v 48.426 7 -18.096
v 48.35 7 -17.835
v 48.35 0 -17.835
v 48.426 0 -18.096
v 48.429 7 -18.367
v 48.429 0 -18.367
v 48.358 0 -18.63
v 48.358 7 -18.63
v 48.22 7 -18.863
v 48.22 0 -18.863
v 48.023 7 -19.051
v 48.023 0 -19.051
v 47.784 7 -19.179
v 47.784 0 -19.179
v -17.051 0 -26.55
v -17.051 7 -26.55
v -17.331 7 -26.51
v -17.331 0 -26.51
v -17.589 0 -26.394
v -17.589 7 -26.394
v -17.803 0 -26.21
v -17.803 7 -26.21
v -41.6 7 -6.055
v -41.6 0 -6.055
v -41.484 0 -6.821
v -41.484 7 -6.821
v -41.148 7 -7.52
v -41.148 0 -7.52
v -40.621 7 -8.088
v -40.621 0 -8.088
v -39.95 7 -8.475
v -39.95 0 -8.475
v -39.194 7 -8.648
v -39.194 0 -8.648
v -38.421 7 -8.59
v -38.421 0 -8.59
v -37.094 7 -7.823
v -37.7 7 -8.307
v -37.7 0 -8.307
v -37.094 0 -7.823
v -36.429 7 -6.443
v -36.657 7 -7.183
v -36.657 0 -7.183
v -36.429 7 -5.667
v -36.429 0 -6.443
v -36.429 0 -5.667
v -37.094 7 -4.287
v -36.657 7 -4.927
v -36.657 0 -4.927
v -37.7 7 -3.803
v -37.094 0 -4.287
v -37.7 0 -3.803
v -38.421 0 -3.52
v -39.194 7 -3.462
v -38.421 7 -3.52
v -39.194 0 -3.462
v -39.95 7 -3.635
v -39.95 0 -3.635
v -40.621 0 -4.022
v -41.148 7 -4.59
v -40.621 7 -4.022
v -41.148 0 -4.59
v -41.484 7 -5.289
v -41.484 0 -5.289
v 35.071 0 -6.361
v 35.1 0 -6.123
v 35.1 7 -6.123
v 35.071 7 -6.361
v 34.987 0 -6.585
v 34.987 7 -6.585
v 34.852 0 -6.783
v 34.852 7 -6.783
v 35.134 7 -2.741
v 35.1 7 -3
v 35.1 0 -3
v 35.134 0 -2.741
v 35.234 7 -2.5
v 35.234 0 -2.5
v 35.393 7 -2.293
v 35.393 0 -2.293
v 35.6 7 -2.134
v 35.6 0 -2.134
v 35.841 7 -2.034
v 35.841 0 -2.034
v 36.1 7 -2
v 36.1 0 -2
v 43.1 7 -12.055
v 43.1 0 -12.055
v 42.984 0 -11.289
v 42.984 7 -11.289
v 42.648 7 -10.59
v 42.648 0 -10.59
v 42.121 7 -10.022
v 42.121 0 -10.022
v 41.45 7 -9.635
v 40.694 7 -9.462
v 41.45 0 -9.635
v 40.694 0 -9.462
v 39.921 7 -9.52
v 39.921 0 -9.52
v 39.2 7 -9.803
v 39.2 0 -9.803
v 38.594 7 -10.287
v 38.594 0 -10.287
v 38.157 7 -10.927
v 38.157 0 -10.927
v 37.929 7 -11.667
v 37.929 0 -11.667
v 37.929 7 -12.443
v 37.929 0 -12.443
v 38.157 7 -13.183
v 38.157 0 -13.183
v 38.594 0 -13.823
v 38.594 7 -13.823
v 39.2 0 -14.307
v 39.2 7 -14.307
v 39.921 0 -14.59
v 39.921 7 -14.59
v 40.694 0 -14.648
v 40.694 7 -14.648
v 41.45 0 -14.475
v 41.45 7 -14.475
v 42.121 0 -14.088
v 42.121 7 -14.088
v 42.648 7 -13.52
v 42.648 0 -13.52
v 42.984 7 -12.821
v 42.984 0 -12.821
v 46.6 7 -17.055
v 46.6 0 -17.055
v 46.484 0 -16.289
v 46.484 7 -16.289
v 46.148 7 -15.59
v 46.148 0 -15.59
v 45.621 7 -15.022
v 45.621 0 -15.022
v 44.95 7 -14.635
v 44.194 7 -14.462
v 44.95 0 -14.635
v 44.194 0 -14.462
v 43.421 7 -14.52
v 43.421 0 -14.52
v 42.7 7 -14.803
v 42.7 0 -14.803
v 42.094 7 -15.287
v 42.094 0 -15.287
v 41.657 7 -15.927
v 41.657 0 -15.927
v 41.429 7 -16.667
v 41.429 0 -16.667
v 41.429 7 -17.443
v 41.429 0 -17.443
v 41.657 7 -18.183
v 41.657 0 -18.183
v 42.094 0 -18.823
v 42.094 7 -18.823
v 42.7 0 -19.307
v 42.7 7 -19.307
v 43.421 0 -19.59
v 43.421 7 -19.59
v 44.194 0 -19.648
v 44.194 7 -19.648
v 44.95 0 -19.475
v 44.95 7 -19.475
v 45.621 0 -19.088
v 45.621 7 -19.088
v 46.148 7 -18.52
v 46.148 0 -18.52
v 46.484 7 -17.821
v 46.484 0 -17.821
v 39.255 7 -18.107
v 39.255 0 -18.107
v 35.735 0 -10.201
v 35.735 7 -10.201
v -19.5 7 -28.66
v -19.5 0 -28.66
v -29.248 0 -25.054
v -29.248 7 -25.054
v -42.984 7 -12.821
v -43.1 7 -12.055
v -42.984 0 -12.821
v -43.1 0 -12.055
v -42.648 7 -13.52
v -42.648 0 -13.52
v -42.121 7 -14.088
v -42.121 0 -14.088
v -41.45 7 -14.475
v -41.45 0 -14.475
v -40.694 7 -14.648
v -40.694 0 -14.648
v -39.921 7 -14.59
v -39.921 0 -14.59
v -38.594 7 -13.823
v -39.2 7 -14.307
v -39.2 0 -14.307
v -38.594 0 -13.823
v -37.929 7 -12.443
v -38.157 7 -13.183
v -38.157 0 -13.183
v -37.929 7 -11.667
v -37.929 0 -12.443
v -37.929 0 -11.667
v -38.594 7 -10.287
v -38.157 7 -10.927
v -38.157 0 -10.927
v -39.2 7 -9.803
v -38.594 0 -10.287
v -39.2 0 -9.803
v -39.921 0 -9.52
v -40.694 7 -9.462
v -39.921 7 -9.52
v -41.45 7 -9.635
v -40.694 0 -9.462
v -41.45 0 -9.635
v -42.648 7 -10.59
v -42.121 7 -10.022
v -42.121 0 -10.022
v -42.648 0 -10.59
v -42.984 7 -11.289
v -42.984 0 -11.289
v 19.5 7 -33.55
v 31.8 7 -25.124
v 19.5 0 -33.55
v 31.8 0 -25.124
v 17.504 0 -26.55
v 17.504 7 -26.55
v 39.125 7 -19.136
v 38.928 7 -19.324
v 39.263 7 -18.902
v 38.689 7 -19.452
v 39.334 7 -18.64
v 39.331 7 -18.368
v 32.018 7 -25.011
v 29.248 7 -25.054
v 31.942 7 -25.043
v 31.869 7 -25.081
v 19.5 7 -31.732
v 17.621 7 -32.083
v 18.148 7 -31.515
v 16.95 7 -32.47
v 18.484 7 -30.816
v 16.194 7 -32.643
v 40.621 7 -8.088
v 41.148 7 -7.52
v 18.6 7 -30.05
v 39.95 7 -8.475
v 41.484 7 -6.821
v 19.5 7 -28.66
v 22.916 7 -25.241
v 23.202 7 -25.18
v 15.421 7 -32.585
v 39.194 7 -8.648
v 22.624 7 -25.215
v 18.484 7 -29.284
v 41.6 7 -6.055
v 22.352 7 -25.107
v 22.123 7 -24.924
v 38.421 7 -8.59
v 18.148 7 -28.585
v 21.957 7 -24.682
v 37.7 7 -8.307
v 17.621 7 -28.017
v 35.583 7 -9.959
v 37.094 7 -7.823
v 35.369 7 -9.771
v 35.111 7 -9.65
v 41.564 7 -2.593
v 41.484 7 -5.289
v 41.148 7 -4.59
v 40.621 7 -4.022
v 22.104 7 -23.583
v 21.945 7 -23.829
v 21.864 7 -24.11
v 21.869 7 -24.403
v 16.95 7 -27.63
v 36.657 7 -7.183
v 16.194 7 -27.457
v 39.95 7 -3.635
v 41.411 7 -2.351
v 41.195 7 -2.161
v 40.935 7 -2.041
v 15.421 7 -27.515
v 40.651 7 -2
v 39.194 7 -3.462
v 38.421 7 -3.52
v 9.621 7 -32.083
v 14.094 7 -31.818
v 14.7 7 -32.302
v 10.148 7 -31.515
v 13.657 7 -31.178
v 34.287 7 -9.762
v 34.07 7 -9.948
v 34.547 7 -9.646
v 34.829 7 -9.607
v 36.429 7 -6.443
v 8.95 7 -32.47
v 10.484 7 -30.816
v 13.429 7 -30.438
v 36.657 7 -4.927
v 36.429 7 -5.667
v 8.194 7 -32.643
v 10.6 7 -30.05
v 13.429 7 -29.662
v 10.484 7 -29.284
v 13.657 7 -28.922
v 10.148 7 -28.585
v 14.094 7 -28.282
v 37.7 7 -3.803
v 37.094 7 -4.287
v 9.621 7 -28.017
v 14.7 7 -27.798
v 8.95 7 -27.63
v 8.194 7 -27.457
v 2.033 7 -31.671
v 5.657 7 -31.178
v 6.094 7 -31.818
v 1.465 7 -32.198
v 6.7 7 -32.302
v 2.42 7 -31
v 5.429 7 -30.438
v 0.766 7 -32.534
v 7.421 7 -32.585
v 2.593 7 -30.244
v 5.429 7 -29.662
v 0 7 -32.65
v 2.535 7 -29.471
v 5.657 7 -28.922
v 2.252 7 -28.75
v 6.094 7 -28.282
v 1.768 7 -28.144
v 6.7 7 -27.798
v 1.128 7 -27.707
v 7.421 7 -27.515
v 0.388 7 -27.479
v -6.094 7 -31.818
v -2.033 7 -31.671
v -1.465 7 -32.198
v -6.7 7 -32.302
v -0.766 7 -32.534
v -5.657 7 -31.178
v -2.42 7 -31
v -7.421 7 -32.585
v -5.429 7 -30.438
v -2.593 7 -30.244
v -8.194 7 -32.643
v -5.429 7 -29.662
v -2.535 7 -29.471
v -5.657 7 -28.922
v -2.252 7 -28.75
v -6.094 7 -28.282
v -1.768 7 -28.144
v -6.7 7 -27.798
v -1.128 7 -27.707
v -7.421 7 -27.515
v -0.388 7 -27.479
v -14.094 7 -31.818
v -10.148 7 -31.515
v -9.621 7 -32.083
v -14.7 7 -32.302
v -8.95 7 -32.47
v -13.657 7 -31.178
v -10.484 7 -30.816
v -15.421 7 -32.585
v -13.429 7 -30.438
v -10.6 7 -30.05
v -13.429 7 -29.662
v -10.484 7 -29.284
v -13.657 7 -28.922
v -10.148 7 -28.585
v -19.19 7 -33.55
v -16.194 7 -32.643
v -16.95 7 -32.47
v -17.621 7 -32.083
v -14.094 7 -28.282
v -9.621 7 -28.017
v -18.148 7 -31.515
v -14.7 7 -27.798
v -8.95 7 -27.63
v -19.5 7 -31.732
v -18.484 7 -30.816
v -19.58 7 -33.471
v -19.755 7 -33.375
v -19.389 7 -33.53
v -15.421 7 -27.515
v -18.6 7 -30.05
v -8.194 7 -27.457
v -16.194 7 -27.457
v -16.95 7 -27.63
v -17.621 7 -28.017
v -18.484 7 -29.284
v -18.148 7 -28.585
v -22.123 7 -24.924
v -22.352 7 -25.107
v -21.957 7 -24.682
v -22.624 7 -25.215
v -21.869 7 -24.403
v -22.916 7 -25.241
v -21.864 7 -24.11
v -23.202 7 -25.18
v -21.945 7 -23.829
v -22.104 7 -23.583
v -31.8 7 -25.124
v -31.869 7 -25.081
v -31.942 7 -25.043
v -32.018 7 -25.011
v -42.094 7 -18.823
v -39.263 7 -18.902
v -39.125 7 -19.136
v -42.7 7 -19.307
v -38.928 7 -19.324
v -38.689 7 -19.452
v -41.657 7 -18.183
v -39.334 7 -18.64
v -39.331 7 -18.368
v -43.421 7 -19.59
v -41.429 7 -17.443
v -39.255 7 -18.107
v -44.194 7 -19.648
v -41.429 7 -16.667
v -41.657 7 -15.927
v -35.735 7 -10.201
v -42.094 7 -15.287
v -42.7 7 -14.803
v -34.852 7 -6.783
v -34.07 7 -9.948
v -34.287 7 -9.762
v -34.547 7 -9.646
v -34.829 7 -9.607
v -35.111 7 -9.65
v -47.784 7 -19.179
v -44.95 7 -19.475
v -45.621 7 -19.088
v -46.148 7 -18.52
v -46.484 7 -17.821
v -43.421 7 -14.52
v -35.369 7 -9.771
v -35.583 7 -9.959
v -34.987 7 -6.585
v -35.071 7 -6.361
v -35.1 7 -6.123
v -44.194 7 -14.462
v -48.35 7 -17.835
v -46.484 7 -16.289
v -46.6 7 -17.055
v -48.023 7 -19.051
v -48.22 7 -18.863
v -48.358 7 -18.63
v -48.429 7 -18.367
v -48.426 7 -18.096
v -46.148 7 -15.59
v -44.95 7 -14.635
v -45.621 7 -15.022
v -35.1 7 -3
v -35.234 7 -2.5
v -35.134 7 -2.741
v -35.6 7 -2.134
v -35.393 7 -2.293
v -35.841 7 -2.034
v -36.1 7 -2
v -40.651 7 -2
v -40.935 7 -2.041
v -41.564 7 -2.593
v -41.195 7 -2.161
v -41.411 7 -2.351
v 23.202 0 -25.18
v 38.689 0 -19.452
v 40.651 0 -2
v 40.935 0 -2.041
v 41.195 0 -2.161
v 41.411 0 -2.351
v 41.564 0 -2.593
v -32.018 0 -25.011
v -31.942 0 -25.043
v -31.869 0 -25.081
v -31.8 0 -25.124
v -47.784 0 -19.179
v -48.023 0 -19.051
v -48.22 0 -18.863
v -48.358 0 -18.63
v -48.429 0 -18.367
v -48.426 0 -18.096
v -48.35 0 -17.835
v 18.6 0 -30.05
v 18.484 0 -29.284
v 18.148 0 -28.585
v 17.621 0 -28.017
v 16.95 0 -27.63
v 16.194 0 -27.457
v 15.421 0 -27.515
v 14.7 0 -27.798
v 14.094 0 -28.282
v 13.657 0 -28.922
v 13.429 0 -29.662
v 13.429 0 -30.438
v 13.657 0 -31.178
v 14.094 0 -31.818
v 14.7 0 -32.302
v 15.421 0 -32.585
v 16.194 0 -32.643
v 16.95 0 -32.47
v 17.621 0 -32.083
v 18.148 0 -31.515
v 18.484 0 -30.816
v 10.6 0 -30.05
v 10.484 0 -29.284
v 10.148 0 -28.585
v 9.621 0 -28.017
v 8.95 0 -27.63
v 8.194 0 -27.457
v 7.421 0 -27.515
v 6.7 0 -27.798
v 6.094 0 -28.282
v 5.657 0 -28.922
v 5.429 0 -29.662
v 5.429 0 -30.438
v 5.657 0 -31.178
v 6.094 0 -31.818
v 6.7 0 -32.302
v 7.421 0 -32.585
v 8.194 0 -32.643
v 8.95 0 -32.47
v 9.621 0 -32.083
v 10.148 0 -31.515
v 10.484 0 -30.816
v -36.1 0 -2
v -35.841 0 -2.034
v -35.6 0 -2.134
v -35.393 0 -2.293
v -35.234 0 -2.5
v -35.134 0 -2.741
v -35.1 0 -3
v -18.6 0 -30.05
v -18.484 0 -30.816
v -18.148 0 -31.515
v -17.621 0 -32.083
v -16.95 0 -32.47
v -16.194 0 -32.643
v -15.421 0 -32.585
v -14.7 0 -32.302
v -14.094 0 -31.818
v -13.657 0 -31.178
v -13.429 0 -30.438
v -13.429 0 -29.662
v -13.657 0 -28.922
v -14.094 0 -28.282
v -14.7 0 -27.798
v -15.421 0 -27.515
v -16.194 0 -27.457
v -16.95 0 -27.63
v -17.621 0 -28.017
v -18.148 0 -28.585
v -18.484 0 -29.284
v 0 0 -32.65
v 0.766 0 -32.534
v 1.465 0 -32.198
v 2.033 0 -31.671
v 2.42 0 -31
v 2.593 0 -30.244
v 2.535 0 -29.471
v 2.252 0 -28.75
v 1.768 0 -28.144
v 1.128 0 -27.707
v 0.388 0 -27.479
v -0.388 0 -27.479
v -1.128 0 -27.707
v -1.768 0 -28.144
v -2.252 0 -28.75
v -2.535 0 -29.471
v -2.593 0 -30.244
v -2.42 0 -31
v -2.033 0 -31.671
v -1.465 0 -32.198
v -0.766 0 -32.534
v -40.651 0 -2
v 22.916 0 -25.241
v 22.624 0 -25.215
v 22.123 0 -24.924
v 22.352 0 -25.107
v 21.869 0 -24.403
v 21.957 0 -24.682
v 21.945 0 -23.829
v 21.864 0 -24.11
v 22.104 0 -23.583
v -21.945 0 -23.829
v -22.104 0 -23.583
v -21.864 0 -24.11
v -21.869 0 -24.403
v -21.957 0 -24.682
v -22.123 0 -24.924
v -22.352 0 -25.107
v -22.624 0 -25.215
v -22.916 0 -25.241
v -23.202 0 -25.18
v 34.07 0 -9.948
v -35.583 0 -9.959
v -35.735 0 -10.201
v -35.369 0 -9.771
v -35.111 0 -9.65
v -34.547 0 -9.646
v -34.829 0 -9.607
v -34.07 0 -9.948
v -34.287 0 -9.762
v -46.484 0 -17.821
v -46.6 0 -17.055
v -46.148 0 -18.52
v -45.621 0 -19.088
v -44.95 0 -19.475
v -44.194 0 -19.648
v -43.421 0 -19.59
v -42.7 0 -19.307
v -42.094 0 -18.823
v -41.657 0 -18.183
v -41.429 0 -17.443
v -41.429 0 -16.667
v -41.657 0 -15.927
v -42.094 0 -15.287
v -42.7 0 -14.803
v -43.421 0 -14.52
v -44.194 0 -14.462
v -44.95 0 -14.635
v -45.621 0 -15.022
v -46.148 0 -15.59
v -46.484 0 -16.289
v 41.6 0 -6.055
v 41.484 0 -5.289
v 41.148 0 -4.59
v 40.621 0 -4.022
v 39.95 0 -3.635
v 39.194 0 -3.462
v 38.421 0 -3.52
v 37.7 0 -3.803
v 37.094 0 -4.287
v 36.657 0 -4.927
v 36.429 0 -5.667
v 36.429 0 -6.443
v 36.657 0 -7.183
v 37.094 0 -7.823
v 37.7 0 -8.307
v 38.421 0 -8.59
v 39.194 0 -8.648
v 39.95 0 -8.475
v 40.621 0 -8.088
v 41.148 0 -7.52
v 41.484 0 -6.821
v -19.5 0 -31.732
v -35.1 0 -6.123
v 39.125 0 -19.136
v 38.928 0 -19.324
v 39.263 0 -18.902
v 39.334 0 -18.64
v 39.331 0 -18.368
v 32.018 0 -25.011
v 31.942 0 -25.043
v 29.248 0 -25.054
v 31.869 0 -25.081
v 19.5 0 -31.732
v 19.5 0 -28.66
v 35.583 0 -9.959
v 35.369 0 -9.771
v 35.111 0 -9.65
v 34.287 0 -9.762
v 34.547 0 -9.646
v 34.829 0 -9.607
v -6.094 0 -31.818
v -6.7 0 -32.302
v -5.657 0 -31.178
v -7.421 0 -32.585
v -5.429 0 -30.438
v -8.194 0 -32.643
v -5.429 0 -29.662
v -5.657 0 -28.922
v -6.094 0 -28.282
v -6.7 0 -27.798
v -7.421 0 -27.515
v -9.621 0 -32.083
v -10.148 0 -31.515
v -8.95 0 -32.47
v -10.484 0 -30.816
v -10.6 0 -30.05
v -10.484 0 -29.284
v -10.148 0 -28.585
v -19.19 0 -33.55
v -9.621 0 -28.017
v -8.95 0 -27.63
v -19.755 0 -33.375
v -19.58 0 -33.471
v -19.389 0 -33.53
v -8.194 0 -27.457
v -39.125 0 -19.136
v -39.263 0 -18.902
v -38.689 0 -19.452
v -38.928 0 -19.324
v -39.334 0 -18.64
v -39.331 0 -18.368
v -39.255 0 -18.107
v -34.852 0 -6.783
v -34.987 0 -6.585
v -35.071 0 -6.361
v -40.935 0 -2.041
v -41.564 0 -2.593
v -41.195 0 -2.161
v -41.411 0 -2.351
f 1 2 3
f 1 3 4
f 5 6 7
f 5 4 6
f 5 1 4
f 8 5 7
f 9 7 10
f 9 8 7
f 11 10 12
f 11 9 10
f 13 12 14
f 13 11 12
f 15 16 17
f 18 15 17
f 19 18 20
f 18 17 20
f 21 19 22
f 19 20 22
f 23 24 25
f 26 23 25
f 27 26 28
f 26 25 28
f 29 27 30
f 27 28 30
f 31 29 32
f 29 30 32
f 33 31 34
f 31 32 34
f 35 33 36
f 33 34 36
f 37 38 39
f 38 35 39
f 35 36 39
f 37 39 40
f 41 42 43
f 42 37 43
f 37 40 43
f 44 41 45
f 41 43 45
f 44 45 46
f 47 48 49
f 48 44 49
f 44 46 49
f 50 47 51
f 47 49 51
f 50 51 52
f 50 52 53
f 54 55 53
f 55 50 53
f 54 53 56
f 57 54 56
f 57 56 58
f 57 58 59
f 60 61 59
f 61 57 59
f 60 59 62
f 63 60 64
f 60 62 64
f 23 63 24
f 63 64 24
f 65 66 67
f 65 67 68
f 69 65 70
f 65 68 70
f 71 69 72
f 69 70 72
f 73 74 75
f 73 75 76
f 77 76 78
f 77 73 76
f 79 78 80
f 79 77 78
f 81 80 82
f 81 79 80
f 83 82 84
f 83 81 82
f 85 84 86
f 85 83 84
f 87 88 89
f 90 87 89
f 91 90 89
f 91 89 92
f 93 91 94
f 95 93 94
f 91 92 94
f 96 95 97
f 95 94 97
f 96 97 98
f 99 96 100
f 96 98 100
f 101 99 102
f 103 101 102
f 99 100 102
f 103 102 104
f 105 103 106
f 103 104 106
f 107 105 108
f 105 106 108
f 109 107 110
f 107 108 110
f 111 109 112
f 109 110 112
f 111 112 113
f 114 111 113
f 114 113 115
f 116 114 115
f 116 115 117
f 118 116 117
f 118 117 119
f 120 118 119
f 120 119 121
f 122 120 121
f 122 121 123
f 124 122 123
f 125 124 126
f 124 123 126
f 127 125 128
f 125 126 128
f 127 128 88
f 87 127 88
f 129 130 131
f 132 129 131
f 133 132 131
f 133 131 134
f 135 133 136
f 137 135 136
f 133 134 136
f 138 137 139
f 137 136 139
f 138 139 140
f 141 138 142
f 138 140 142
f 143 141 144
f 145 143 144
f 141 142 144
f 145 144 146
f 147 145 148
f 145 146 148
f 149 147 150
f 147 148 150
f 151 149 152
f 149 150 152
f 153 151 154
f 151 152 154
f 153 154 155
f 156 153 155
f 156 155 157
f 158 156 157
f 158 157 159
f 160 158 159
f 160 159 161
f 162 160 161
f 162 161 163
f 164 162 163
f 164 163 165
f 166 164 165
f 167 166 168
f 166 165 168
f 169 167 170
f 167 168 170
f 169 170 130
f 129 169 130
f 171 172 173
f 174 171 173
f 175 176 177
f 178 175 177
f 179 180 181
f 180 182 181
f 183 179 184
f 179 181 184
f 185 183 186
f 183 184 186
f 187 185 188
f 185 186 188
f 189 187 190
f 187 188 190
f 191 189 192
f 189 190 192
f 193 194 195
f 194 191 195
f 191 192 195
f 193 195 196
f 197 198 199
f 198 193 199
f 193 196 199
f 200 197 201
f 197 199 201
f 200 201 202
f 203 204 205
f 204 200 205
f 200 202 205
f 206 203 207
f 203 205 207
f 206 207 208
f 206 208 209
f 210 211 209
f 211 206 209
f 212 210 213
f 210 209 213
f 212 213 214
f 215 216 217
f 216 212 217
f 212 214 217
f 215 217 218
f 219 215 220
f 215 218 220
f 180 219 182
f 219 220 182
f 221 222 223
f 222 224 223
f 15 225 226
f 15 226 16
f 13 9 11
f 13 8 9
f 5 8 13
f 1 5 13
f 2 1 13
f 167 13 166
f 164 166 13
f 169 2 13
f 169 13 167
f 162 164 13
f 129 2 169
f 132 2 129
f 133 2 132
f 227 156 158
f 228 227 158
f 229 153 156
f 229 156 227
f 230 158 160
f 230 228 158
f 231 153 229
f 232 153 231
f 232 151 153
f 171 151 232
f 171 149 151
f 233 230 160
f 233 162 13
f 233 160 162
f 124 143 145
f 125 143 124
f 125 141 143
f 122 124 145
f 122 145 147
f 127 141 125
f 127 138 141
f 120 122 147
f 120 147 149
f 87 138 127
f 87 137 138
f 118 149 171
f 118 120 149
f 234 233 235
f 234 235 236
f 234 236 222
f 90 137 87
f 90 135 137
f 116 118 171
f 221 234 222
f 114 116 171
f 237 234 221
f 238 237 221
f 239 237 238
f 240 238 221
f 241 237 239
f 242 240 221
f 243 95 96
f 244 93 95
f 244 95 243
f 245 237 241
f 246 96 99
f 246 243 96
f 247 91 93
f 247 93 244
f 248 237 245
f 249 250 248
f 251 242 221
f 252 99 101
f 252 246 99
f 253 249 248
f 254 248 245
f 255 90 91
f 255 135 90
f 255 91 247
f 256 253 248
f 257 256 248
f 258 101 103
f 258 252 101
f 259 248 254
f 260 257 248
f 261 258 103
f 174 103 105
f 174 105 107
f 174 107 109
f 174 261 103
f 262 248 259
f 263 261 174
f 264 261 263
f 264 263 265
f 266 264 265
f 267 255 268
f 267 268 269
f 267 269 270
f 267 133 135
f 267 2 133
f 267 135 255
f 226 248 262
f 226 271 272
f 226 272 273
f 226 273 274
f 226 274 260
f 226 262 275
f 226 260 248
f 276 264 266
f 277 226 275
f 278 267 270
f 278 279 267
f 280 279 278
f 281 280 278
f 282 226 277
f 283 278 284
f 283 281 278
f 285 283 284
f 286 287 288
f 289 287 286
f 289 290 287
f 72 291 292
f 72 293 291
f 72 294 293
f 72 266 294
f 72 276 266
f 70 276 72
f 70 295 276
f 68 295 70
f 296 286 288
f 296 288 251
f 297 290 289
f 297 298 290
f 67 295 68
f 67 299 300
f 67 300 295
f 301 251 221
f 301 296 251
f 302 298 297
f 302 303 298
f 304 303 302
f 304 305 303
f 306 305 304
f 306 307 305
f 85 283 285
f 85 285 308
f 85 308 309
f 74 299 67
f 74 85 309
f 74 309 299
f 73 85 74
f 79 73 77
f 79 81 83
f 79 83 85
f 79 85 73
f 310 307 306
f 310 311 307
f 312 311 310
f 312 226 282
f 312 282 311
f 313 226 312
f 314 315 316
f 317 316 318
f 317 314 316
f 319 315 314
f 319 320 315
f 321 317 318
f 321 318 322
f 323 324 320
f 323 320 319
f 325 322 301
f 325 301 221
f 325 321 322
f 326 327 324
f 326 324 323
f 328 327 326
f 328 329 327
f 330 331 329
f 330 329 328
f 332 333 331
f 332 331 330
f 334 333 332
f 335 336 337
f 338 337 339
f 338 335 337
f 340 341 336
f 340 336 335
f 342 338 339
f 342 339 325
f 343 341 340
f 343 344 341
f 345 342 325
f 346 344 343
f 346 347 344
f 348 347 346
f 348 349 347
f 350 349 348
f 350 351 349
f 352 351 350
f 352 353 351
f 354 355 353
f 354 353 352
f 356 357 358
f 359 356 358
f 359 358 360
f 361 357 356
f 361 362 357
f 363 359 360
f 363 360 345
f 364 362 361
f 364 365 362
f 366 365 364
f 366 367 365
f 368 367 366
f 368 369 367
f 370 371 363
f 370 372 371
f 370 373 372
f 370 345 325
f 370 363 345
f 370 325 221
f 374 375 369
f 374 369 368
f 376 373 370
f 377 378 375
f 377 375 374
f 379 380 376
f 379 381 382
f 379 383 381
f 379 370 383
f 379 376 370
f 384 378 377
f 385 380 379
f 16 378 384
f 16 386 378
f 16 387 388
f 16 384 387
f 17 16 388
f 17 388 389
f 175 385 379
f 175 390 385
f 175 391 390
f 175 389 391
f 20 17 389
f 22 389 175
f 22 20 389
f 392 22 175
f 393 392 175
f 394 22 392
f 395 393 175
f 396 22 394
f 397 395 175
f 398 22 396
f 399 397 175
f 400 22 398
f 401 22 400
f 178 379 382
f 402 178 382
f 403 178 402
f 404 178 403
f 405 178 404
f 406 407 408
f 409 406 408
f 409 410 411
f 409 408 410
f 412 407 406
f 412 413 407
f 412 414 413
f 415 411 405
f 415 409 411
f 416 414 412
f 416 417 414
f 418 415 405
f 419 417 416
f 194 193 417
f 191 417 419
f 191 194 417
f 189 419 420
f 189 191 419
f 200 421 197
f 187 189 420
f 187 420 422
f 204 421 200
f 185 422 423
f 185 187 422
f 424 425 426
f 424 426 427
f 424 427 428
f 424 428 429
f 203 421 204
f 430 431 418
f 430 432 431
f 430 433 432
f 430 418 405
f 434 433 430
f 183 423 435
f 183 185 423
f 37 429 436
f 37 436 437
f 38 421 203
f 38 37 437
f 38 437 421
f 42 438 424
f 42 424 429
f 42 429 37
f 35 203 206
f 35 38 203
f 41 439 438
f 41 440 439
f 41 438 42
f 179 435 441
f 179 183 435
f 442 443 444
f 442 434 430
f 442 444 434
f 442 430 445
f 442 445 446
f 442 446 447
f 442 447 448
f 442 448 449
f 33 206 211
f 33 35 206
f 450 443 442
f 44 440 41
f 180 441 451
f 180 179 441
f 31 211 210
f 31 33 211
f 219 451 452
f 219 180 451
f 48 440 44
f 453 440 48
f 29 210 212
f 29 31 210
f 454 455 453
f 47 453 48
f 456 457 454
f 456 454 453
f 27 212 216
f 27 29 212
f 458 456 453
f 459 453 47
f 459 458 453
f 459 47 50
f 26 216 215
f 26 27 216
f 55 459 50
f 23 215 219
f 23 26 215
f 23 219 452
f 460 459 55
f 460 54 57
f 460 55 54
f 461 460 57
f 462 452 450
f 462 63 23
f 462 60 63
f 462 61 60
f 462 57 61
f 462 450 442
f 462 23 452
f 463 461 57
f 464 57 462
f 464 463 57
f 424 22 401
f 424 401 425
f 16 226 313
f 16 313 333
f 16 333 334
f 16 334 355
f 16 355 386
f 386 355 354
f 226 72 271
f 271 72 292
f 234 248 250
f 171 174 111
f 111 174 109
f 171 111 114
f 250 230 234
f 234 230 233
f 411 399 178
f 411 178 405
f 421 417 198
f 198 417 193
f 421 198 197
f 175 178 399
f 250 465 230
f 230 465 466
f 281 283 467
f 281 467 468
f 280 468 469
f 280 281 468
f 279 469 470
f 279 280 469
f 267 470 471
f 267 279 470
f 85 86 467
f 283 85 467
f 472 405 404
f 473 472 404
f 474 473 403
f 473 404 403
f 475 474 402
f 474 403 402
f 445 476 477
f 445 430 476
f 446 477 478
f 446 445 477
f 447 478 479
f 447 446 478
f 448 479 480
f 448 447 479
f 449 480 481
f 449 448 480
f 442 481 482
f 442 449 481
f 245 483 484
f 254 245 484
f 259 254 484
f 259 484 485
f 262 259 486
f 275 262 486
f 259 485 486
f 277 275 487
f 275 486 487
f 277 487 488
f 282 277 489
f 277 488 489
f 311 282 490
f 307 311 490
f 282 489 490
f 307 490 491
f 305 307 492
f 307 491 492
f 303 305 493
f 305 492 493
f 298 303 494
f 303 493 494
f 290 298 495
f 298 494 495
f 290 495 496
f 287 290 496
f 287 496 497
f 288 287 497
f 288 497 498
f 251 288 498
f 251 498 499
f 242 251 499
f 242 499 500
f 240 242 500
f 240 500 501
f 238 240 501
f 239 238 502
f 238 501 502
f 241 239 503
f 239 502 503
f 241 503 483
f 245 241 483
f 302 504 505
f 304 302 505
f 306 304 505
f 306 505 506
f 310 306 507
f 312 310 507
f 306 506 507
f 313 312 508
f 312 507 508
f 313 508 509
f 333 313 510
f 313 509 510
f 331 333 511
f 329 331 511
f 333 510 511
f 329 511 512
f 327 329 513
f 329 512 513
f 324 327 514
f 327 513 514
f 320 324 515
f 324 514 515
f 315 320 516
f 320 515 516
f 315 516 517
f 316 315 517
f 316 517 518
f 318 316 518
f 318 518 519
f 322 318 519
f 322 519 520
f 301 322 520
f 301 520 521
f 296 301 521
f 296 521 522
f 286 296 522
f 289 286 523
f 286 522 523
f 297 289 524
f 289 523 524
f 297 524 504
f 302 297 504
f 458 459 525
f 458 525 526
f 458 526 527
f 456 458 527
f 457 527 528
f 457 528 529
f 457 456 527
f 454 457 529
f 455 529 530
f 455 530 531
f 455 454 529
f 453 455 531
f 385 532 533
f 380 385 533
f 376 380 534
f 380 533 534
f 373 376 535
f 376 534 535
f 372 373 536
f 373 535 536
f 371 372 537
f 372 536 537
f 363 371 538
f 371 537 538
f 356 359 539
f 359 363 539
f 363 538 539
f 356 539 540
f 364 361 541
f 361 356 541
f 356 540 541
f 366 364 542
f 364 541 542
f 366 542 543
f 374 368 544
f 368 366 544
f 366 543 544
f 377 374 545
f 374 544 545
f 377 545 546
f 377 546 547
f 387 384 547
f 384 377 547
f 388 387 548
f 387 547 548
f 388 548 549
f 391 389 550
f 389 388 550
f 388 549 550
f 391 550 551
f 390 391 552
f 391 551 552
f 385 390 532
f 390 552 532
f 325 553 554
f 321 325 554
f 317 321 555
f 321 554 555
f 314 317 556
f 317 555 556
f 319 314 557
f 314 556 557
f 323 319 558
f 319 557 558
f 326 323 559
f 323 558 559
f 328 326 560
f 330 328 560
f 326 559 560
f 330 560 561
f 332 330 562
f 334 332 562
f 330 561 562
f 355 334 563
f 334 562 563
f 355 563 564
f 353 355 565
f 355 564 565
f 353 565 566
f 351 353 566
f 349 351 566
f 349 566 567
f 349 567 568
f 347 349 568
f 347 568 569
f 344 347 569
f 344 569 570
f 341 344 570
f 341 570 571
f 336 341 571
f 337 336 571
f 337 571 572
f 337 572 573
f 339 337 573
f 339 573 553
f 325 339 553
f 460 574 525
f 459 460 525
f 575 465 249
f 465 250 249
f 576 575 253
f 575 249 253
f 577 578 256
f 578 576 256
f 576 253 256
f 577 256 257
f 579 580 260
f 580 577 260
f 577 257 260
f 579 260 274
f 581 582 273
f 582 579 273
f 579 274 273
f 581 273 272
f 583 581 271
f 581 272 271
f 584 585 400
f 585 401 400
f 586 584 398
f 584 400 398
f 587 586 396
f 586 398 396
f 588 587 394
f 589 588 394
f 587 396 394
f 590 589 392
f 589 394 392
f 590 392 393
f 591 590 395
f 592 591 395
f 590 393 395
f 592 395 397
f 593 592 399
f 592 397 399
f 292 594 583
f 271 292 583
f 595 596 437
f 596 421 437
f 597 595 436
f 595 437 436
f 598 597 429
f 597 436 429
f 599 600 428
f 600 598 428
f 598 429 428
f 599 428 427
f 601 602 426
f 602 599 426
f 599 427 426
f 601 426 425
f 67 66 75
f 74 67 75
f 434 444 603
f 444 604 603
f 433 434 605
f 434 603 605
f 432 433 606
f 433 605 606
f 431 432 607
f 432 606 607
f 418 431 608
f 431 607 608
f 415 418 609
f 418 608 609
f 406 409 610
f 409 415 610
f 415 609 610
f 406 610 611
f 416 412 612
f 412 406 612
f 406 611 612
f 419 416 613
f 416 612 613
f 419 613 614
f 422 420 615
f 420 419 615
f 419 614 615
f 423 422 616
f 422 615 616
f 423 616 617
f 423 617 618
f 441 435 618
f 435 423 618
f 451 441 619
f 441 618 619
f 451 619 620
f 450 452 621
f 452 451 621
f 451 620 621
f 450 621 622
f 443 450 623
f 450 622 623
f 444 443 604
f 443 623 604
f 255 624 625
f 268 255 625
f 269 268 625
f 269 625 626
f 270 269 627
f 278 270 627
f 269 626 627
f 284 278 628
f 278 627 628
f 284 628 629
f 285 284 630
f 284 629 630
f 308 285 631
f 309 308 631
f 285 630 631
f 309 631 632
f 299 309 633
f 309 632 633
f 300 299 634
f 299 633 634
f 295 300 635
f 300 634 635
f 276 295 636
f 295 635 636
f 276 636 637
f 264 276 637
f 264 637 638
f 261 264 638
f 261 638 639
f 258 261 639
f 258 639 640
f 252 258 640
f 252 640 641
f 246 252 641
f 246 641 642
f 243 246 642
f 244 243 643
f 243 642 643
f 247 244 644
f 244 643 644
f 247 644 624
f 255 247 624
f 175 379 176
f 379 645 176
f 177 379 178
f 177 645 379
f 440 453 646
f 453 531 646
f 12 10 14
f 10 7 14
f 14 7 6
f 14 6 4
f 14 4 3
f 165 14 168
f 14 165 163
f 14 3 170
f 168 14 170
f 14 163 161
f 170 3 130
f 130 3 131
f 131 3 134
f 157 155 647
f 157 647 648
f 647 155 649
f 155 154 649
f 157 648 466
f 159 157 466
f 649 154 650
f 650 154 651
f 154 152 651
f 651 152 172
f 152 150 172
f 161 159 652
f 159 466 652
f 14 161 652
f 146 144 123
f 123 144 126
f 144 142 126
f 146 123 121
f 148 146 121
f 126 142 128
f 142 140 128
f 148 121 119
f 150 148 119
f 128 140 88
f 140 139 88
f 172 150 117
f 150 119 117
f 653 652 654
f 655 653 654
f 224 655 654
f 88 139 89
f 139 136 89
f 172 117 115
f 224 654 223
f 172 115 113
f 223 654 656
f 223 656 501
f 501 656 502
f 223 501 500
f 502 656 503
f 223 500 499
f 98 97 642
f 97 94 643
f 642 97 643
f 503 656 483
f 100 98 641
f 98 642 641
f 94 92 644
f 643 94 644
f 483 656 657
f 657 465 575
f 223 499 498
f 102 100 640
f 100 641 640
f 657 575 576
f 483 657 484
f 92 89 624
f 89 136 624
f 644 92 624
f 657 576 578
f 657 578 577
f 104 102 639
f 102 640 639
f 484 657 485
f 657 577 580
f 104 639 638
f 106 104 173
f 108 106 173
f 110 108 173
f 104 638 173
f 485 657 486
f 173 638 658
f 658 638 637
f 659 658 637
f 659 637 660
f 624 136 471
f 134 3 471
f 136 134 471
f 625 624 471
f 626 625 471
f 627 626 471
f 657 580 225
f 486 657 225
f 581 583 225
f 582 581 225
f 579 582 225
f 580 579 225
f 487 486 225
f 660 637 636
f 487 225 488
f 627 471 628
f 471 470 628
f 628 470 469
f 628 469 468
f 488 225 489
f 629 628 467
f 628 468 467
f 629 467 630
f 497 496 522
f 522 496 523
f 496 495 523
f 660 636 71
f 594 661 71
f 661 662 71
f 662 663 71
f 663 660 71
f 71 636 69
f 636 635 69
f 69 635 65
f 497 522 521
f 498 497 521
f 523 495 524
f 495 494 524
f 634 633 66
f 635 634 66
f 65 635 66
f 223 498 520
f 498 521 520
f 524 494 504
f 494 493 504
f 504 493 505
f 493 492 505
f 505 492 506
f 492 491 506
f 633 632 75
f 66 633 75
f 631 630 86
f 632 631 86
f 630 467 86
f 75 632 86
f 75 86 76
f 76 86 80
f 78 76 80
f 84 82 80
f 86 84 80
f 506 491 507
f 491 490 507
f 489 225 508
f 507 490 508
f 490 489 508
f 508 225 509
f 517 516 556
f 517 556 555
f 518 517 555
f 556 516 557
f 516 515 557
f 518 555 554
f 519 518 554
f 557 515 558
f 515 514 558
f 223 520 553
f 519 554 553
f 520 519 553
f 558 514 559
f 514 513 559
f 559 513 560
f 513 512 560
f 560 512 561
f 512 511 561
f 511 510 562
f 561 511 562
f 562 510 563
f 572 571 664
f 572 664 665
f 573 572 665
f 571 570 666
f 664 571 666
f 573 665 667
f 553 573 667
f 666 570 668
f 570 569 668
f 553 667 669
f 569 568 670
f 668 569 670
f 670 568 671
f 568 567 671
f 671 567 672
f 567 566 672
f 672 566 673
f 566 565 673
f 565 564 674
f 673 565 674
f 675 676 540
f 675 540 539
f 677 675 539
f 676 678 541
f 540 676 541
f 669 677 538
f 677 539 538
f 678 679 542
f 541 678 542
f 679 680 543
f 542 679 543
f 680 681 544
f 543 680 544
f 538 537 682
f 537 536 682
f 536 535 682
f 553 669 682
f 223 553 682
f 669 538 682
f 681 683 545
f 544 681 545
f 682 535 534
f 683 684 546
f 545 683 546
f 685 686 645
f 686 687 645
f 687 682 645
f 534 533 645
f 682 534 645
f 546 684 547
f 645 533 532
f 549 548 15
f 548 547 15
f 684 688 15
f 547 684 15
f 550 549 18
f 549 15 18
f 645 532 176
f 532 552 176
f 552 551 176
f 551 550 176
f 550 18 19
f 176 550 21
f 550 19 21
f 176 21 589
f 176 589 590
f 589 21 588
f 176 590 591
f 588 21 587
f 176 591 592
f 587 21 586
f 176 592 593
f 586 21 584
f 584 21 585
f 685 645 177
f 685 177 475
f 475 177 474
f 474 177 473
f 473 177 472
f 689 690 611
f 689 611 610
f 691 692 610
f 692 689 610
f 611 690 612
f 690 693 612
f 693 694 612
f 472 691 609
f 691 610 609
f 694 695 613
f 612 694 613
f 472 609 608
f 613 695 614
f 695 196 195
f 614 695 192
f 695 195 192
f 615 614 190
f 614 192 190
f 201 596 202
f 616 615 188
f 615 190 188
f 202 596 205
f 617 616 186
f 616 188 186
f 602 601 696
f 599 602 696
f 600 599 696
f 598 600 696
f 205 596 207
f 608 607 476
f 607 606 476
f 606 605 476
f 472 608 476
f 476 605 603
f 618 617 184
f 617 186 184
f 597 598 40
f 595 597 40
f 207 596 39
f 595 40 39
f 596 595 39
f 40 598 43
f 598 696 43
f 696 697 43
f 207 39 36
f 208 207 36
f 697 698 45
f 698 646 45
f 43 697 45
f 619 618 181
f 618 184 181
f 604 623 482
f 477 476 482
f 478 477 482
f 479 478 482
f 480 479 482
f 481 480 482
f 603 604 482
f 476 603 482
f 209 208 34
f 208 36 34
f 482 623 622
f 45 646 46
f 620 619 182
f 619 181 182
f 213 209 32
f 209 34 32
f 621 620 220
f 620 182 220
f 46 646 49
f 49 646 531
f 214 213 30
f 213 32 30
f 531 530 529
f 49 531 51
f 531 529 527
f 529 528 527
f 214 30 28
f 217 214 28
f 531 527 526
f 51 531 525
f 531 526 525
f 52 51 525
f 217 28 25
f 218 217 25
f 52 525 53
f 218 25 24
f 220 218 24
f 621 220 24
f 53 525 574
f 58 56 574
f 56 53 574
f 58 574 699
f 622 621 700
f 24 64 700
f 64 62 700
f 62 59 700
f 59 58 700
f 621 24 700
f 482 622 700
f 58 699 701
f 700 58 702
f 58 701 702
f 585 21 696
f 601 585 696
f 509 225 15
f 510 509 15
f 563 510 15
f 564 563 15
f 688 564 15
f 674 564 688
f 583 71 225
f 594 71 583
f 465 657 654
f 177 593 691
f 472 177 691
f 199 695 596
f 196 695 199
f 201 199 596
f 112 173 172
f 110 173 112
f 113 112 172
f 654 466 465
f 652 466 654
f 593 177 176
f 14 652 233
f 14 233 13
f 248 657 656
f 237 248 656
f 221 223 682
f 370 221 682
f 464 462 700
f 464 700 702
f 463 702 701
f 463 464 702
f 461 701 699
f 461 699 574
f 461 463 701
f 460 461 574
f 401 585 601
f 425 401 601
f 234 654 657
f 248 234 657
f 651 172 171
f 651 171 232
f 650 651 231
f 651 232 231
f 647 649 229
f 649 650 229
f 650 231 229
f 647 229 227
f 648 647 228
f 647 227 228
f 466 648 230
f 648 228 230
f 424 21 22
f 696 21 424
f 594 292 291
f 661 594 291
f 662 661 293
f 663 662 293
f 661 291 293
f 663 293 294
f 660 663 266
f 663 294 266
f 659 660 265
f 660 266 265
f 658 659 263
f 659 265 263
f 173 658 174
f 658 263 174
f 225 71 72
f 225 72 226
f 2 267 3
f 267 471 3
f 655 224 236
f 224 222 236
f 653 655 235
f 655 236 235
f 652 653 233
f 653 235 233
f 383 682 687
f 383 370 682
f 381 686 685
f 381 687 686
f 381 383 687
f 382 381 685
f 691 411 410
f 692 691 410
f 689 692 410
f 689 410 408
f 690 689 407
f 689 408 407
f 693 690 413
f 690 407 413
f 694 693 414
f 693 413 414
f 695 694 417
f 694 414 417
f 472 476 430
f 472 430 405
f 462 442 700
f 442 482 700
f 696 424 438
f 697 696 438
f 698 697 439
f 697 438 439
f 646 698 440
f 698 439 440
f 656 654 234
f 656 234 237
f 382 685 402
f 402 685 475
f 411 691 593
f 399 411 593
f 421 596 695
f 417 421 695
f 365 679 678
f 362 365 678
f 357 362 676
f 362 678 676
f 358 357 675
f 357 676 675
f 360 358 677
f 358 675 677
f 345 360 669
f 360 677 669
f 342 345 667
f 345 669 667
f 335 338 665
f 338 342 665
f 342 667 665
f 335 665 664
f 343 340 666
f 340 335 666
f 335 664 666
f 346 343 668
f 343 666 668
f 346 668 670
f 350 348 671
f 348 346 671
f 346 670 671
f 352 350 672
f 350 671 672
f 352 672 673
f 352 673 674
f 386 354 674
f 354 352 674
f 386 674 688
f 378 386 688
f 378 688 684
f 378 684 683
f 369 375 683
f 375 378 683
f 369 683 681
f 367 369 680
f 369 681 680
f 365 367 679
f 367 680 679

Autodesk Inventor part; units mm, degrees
ref_plane "YZ Plane" through (0, 0, 0) normal (1, 0, 0) x (0, 1, 0)
ref_plane "XZ Plane" through (0, 0, 0) normal (0, 1, 0) x (-1, 0, 0)
ref_plane "XY Plane" through (0, 0, 0) normal (0, 0, 1) x (1, 0, 0)
sketch "Sketch1" plane through (0, 0, 0) normal (0, 1, 0) x (-1, 0, 0)
  circle A0 centre (39, -6.055) radius 2.6
  circle A1 centre (40.5, -12.055) radius 2.6
  circle A2 centre (44, -17.055) radius 2.6
  line L0 (48.784, -18.8092) -> (41.3, -2)
  line L1 (0, 0) -> (60.8895, 0) construction
  line L2 (41.3, -2) -> (35.1, -2)
  circle A3 centre (16, -30.05) radius 2.6
  circle A4 centre (8, -30.05) radius 2.6
  arc A5 (0, -32.65) -> (0, -27.45) centre (0, -30.05) ccw
  line L3 (0, -33.55) -> (0, -32.65)
  line L4 (0, -27.45) -> (0, -26.55)
  line L5 (35.1, -2) -> (35.1, -6.5)
  line L6 (35.1, -8.7741) -> (39.6892, -19.0815)
  line L7 (0, -33.55) -> (19.5, -33.55)
  line L8 (19.5, -31.7318) -> (19.5, -28.6602)
  line L9 (19.5, -33.55) -> (31.902, -25.0543)
  line L10 (19.5, -31.7318) -> (29.2478, -25.0543)
  line L11 (17.5043, -26.55) -> (35.1, -6.5)
  line L12 (19.5, -26.55) -> (35.1, -8.7741)
  line L13 (19.5, -28.6602) -> (29.2478, -25.0543)
  line L14 (0, -26.55) -> (17.5043, -26.55)
  line L15 (39.6892, -19.0815) -> (19.5, -26.55)
  line L16 (48.784, -18.8092) -> (31.902, -25.0543)
  dimension "d0" = 5.2
  dimension "d1" = 1.5
  dimension "d3" = 3.5
  dimension "d5" = 6
  dimension "d6" = 5
  dimension "d12" = 39
  dimension "d14" = 114
  dimension "d15" = 18.4
  dimension "d16" = 6.055
  dimension "d17" = 6.2
  dimension "d19" = 30.05
  dimension "d21" = 8
  dimension "d22" = 5.2
  dimension "d26" = 3.9
  dimension "d29" = 19.5
  dimension "d31" = 18
  dimension "d35" = 1.5
  dimension "d37" = 1.5
  dimension "d40" = 3.5
  dimension "d41" = 3.5
  dimension "d44" = 4.5
  dimension "d45" = 0
  dimension "d46" = 8
  dimension "d48" = 2.9
  dimension "d49" = 2
  dimension "d51" = 0
extrude "Extrusion1" add sketch "Sketch1" along normal blind 7
mirror "Mirror1" about plane through (0, 0, -32.65) normal (1, 0, 0) of "Extrusion1"
fillet "Fillet1" radius 1 18 edges at (-35.1, 3.5, -8.7741) (-39.6892, 3.5, -19.0815) (-19.5, 3.5, -26.55) (19.5, 3.5, -26.55) (39.6892, 3.5, -19.0815) (35.1, 3.5, -8.7741) (48.784, 3.5, -18.8092) (41.3, 3.5, -2) (35.1, 3.5, -2) (35.1, 3.5, -6.5) (-17.5043, 3.5, -26.55) (-35.1, 3.5, -6.5) (-35.1, 3.5, -2) (-41.3, 3.5, -2) (-48.784, 3.5, -18.8092) (-31.902, 3.5, -25.0543) (-19.5, 3.5, -33.55) (31.902, 3.5, -25.0543)
equation "\"d37\" = d34"
equation "\"d41\" = d40"
equation "\"d46\" = d21"
equation "\"d34\" = d35"
properties part number "2020-04-02-10-10501-LED_Splitter_Transparent" material "ABS Plastic"
